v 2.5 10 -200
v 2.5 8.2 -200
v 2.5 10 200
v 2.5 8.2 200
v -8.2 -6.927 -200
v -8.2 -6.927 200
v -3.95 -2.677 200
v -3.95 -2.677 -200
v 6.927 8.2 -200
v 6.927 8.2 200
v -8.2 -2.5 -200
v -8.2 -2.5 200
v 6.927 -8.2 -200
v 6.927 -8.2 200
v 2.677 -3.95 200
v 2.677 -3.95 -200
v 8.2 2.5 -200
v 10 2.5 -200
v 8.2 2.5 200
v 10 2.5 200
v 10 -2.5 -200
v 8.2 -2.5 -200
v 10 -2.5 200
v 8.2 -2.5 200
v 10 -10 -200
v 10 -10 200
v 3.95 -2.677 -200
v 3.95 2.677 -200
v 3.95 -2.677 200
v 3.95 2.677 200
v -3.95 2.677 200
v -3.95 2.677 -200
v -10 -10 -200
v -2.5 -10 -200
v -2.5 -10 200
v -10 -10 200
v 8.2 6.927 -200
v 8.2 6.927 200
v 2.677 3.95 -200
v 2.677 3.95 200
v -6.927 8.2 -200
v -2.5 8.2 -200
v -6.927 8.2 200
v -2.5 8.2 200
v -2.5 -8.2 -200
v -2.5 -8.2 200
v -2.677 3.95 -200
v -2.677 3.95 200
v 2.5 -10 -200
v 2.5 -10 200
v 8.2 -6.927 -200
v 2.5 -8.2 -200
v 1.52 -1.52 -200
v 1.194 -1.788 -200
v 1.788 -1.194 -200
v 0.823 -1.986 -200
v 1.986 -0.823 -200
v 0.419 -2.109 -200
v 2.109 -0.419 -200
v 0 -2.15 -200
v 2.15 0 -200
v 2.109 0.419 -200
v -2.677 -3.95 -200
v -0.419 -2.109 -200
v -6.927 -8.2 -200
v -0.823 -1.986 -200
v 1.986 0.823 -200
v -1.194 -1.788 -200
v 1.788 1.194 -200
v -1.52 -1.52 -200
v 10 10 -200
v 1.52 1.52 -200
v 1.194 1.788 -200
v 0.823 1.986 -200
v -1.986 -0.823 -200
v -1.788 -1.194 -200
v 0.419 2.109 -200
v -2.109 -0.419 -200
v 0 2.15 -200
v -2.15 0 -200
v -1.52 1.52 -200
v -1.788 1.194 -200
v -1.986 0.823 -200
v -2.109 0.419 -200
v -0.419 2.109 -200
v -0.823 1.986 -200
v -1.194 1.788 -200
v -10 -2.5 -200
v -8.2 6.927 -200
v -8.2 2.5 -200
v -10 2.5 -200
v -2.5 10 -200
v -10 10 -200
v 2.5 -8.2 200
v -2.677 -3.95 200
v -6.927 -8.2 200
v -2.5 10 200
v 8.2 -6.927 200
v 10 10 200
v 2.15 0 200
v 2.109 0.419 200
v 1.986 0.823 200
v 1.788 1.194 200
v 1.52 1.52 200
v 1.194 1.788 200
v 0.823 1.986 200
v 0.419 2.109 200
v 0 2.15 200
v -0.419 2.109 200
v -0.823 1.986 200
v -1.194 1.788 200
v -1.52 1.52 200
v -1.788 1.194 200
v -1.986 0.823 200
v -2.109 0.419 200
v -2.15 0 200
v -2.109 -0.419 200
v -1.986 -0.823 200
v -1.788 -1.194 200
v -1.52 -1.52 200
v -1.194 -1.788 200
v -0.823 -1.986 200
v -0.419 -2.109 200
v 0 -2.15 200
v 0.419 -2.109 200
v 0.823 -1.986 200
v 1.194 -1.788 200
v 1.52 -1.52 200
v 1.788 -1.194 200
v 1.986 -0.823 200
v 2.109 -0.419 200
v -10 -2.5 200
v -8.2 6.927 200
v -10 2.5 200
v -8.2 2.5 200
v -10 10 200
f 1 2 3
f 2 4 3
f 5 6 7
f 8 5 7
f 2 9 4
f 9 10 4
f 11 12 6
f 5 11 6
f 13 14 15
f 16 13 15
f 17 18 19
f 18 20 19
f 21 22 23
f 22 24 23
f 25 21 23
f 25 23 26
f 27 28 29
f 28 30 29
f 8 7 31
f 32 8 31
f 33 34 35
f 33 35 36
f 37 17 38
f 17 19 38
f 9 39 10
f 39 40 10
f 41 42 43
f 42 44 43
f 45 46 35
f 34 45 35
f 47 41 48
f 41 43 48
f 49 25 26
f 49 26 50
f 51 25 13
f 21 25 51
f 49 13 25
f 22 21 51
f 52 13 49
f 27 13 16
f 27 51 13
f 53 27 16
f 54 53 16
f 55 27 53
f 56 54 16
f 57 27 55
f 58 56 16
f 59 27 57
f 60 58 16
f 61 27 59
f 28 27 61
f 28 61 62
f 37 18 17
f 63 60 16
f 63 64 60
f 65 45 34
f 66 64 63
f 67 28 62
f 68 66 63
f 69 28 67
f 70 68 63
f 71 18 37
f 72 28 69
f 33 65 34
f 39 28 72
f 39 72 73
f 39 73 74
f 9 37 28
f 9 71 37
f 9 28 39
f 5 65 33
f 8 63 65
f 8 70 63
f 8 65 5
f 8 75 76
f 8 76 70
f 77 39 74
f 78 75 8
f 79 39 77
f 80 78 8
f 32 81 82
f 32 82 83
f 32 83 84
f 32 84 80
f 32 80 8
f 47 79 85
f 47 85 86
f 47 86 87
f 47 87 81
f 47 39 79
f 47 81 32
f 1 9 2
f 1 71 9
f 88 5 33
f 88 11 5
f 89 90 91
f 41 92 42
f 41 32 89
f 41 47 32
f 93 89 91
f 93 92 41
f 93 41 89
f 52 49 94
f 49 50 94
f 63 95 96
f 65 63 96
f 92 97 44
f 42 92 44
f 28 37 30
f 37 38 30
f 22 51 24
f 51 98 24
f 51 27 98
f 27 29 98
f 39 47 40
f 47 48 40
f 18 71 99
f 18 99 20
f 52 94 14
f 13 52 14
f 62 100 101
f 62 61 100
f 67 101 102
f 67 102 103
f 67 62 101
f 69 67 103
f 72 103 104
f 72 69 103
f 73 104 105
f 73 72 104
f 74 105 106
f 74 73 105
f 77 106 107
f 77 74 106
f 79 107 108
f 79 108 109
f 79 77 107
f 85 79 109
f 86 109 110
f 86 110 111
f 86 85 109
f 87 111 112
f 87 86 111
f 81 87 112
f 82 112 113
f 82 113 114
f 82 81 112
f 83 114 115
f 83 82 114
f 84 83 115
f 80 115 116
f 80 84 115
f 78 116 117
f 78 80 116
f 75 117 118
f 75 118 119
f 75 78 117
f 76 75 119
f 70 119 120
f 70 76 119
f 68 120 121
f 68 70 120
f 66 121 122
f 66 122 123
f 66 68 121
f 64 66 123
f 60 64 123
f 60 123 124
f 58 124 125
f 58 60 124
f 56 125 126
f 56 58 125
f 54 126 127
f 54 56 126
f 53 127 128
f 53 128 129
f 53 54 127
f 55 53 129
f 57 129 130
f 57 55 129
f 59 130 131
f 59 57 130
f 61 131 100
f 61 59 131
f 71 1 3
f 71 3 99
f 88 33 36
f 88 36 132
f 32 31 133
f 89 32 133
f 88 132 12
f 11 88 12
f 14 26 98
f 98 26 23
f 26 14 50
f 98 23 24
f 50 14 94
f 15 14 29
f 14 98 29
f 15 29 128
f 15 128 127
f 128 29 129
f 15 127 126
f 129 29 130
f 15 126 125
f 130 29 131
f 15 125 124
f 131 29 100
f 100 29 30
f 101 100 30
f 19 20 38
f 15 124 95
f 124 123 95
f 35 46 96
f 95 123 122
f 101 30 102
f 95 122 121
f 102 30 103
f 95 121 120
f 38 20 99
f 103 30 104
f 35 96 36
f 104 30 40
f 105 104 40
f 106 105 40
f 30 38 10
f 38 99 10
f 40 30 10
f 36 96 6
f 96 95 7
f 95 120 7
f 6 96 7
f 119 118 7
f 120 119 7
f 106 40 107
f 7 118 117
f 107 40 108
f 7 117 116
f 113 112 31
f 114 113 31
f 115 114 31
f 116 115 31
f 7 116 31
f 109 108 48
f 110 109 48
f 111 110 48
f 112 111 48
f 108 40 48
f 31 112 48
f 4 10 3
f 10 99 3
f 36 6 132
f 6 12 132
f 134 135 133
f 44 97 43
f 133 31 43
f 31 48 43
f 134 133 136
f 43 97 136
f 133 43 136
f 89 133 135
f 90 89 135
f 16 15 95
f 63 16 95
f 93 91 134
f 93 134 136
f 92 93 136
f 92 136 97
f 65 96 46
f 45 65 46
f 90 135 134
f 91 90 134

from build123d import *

# Parameters (mm, degrees)
SKETCH2_R           = 2.15
BOSS_EXTRUDE1_DEPTH = 200


with BuildPart() as part:
    # Sketch2 → Boss-Extrude1 (new body, symmetric)
    with BuildSketch(Plane.XY):
        Polygon((-2.5, 10), (-2.5, 8.2), (-6.927207794, 8.2), (-2.677207794, 3.95), (2.677207794, 3.95), (6.927207794, 8.2), (2.5, 8.2), (2.5, 10), (10, 10), (10, 2.5), (8.2, 2.5), (8.2, 6.927207794), (3.95, 2.677207794), (3.95, -2.677207794), (8.2, -6.927207794), (8.2, -2.5), (10, -2.5), (10, -10), (2.5, -10), (2.5, -8.2), (6.927207794, -8.2), (2.677207794, -3.95), (-2.677207794, -3.95), (-6.927207794, -8.2), (-2.5, -8.2), (-2.5, -10), (-10, -10), (-10, -2.5), (-8.2, -2.5), (-8.2, -6.927207794), (-3.95, -2.677207794), (-3.95, 2.677207794), (-8.2, 6.927207794), (-8.2, 2.5), (-10, 2.5), (-10, 10), align=None)
        Circle(SKETCH2_R, mode=Mode.SUBTRACT)
    extrude(amount=BOSS_EXTRUDE1_DEPTH, both=True)


solid = part.part
